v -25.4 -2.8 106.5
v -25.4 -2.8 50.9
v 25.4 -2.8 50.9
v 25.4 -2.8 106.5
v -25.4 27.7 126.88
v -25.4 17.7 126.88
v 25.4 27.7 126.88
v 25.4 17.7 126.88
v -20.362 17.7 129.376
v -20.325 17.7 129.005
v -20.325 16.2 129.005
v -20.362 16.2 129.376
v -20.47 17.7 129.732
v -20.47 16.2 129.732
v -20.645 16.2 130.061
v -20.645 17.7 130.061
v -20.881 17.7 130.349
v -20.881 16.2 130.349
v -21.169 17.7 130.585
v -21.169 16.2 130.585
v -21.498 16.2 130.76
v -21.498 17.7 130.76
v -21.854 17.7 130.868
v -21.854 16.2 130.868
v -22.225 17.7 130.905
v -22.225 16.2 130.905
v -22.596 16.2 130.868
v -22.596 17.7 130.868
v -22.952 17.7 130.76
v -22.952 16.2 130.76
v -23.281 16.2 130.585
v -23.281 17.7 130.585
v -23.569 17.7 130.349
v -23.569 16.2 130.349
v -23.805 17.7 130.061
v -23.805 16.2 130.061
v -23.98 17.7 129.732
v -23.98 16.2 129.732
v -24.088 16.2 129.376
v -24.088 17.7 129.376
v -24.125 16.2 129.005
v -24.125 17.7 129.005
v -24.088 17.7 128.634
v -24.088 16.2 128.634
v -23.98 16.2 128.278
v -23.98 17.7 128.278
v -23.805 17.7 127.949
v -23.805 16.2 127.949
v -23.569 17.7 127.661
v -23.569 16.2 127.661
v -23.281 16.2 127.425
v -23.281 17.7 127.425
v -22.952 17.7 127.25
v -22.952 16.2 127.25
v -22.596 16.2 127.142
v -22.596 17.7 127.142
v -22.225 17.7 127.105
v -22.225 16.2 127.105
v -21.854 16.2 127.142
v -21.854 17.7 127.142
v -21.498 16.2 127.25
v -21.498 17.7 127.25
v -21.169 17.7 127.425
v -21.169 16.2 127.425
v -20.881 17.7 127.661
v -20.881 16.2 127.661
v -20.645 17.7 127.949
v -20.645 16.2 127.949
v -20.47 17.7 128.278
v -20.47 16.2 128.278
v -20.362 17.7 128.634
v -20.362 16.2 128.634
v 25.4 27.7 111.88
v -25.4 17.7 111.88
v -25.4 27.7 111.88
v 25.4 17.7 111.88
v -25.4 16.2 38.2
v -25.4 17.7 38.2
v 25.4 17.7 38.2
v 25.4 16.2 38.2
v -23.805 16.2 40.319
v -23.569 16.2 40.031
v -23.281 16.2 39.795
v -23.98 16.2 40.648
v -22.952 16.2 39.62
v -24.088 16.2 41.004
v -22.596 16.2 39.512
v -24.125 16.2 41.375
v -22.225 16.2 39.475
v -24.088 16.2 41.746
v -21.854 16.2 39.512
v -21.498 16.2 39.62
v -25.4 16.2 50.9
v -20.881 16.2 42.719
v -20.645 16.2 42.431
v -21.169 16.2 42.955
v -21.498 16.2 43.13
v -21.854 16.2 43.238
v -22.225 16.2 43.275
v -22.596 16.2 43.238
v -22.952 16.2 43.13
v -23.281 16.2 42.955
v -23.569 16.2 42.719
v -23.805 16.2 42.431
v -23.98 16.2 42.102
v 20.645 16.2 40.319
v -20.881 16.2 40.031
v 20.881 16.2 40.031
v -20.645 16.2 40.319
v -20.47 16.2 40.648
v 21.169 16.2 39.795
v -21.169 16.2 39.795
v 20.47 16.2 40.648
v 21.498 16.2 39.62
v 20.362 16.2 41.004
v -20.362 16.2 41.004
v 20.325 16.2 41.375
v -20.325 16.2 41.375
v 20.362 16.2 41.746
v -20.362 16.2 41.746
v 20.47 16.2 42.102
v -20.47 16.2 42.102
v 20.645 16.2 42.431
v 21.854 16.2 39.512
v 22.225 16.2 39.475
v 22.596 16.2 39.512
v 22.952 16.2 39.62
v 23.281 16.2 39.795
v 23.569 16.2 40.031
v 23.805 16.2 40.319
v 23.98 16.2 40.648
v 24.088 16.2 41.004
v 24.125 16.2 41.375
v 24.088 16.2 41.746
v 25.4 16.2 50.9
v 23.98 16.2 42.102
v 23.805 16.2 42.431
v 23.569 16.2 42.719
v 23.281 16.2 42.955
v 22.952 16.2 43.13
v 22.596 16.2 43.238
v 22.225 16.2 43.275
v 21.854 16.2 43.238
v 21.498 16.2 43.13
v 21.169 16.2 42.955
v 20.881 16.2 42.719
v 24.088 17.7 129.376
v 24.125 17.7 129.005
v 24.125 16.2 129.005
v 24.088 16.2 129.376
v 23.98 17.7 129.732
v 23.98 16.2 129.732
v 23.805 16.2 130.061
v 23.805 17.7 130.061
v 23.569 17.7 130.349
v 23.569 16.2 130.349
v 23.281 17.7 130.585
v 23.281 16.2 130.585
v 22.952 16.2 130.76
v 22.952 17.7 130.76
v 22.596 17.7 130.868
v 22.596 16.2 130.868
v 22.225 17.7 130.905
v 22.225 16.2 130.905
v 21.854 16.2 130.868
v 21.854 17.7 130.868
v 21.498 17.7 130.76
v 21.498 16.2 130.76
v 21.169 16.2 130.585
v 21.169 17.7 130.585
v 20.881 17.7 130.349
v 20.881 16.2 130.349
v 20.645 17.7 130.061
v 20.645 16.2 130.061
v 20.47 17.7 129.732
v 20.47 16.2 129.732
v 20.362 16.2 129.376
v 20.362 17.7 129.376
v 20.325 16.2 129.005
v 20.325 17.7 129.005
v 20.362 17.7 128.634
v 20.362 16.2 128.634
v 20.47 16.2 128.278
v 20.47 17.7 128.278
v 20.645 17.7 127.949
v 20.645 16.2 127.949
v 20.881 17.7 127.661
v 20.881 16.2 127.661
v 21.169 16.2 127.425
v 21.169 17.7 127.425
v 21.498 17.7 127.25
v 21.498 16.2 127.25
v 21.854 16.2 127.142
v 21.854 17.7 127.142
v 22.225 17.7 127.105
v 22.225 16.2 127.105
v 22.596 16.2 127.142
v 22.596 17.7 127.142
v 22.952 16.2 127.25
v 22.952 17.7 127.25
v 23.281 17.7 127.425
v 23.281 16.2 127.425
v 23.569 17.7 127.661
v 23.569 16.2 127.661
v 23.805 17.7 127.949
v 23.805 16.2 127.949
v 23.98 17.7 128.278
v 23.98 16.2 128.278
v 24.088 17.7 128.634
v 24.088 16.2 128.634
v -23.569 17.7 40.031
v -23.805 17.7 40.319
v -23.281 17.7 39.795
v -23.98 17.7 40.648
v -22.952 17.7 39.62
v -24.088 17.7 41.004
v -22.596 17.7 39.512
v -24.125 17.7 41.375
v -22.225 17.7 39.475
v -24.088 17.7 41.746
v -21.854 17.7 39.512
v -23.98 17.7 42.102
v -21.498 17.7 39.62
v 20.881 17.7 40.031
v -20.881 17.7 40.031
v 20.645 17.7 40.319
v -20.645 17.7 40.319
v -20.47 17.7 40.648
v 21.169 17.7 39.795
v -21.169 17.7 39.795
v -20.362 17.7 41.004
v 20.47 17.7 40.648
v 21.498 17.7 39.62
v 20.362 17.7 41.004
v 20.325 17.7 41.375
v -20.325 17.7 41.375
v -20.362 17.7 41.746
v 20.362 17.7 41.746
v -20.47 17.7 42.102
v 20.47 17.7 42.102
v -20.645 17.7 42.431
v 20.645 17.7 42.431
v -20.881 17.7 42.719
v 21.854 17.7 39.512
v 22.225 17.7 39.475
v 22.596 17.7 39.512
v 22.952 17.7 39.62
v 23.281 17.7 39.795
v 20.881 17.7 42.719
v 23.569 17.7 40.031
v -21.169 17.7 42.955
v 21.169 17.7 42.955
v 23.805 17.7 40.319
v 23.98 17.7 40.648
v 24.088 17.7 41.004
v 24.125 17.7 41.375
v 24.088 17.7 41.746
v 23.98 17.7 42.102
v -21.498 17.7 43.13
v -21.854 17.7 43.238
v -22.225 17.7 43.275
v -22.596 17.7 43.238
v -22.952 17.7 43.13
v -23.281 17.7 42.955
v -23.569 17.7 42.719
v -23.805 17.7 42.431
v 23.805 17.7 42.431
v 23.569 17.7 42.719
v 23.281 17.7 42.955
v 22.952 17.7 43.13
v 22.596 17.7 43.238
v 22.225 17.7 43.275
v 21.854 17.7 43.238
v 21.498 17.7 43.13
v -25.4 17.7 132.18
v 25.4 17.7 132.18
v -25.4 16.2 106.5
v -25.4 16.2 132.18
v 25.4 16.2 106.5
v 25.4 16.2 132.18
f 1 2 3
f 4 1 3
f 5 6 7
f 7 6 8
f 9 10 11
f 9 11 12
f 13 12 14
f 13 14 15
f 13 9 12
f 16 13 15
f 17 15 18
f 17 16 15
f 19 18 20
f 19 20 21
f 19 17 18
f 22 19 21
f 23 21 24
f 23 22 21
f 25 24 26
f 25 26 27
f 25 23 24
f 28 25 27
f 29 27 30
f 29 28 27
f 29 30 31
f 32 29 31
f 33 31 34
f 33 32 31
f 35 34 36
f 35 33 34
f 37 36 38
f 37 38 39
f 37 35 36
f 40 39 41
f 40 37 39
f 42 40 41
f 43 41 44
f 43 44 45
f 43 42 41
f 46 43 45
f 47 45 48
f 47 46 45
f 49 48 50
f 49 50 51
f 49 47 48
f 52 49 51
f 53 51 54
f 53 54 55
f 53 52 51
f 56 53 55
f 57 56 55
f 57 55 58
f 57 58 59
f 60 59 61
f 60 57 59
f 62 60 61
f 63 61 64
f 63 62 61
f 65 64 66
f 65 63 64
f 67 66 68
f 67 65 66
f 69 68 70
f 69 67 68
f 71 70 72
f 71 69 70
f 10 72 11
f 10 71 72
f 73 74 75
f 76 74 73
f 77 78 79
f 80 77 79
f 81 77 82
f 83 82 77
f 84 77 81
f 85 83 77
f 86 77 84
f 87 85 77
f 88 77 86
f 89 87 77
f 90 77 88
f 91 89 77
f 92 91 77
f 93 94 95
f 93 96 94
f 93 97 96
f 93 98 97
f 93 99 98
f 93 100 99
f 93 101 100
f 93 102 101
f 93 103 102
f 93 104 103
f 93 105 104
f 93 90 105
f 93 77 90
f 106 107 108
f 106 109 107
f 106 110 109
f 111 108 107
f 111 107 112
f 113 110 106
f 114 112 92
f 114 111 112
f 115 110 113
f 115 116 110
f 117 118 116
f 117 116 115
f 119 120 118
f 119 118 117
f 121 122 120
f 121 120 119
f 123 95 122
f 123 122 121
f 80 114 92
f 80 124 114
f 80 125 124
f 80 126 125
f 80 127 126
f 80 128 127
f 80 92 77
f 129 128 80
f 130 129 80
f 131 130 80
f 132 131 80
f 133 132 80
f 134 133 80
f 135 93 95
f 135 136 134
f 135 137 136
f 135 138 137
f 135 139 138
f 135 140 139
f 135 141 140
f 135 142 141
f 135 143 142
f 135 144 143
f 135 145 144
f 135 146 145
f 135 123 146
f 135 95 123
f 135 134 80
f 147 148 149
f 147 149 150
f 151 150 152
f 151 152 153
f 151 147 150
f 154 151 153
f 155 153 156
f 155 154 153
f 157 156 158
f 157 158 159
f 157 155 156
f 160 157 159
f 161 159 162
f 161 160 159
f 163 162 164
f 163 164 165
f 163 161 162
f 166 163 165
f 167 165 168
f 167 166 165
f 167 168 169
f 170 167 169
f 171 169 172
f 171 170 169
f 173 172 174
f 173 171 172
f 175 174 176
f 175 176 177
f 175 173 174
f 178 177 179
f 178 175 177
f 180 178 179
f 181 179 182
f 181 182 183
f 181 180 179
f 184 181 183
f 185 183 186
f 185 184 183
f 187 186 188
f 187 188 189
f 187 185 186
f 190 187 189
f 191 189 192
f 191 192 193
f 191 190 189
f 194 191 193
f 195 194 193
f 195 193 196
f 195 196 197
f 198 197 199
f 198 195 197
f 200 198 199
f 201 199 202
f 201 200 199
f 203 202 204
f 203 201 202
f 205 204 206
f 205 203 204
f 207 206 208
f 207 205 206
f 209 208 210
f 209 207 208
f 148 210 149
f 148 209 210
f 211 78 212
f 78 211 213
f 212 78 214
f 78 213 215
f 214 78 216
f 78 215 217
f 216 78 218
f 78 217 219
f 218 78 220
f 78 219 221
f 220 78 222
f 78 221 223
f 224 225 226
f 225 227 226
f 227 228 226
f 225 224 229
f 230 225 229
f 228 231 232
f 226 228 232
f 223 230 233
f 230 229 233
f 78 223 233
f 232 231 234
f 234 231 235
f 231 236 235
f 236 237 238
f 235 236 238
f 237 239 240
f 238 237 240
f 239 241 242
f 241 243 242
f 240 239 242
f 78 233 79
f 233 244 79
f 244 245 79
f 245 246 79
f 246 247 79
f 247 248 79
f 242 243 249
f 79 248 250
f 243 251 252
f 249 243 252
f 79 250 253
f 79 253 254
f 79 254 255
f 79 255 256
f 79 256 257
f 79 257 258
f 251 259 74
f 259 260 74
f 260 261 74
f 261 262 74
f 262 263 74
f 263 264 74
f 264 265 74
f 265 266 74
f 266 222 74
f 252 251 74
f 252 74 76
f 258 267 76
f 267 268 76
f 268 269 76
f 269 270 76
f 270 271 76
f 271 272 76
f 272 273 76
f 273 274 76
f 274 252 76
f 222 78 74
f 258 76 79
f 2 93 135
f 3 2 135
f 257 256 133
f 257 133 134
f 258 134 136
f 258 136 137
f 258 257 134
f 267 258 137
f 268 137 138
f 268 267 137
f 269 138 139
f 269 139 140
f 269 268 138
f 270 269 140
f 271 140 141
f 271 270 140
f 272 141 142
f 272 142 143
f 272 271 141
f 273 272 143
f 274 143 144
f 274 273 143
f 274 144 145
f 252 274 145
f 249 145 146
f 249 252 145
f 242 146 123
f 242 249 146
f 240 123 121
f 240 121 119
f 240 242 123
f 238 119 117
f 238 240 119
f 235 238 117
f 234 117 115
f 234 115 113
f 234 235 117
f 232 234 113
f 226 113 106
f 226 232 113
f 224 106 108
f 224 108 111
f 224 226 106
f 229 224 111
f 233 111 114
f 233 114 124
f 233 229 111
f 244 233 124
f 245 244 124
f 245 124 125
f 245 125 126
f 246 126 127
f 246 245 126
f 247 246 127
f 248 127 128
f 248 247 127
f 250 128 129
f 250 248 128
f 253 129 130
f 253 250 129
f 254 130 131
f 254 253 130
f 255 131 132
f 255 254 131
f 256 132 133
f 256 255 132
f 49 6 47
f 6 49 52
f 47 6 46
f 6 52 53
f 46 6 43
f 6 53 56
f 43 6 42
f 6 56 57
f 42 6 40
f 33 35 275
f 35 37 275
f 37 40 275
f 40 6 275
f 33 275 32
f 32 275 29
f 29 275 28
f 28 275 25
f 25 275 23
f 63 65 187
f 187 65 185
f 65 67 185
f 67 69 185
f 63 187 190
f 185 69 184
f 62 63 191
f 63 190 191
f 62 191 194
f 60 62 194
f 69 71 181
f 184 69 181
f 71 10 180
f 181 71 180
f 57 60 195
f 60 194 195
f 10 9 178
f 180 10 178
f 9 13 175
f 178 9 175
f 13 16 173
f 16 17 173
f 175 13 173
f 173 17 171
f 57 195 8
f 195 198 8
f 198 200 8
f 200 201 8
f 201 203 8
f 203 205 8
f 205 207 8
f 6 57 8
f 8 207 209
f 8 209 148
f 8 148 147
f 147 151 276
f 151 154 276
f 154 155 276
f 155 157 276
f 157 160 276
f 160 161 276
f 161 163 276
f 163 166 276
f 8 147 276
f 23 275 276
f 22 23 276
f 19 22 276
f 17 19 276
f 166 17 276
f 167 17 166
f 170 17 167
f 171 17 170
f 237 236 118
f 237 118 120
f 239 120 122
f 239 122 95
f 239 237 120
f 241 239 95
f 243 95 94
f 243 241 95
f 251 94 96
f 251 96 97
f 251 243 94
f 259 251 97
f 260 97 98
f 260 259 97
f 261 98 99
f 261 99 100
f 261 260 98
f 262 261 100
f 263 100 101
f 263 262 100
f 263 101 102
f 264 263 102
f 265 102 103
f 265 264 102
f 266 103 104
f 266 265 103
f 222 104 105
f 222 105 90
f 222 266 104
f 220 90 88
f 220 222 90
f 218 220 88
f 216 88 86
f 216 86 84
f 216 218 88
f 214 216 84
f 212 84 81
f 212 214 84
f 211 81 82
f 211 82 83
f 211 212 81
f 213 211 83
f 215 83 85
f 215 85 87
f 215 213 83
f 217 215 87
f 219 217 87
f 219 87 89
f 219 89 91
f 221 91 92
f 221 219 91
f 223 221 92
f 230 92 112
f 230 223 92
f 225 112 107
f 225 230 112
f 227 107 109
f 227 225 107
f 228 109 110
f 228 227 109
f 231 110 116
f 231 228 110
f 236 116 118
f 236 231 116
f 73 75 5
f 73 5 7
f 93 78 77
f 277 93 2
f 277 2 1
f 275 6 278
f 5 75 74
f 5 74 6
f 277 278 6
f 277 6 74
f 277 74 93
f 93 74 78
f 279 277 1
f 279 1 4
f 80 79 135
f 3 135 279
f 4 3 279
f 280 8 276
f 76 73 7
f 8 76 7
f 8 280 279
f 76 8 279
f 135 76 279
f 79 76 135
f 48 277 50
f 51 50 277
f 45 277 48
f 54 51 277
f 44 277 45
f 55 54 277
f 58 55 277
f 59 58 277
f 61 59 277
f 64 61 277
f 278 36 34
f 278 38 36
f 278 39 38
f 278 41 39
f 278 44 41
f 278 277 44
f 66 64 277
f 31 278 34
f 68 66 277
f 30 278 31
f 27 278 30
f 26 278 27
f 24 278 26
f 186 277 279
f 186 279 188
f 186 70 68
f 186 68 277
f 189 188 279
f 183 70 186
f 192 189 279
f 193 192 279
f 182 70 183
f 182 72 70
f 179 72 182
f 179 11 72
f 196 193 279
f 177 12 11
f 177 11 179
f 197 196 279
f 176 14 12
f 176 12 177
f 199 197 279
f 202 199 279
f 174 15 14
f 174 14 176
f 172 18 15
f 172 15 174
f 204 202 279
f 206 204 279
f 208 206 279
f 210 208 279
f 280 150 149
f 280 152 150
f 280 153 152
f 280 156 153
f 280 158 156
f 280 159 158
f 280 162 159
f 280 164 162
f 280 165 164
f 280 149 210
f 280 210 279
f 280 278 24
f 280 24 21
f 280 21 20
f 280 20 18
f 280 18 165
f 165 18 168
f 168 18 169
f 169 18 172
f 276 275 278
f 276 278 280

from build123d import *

# Parameters (mm, degrees)
SKETCH021_W  = 50.8
SKETCH021_H  = 93.98
SKETCH021_R  = 1.9
PAD018_DEPTH = 1.5
SKETCH022_W  = 50.8
SKETCH022_H  = 55.6
PAD019_DEPTH = 19
SKETCH023_W  = 50.8
SKETCH023_H  = 15
PAD020_DEPTH = 10


with BuildPart() as part:
    # Sketch021 → Pad018 (new body)
    with BuildSketch(Plane.XZ):
        with Locations((0, 85.19)):
            Rectangle(SKETCH021_W, SKETCH021_H)
        with Locations((-22.225, 129.005)):
            Circle(SKETCH021_R, mode=Mode.SUBTRACT)
        with Locations((22.225, 129.005)):
            Circle(SKETCH021_R, mode=Mode.SUBTRACT)
        with Locations((22.225, 41.375)):
            Circle(SKETCH021_R, mode=Mode.SUBTRACT)
        with Locations((-22.225, 41.375)):
            Circle(SKETCH021_R, mode=Mode.SUBTRACT)
    extrude(amount=PAD018_DEPTH)

    # Sketch022 (on Face10 of Pad018) → Pad019 (join)
    with BuildSketch(Plane.XZ.offset(1.5)):
        with Locations((0, 78.7)):
            Rectangle(SKETCH022_W, SKETCH022_H)
    extrude(amount=PAD019_DEPTH)

    # Sketch023 (on Face4 of Pad019) → Pad020 (join)
    with BuildSketch(Plane(origin=(0, 0, 0), x_dir=(1, 0, 0), z_dir=(0, 1, 0))):
        with Locations((0, -119.38)):
            Rectangle(SKETCH023_W, SKETCH023_H)
    extrude(amount=PAD020_DEPTH)


with BuildPart() as part_1:
    # Body010 placement: moved
    add(part.part.moved(Location((0, 17.7, 0))))


solid = part_1.part
